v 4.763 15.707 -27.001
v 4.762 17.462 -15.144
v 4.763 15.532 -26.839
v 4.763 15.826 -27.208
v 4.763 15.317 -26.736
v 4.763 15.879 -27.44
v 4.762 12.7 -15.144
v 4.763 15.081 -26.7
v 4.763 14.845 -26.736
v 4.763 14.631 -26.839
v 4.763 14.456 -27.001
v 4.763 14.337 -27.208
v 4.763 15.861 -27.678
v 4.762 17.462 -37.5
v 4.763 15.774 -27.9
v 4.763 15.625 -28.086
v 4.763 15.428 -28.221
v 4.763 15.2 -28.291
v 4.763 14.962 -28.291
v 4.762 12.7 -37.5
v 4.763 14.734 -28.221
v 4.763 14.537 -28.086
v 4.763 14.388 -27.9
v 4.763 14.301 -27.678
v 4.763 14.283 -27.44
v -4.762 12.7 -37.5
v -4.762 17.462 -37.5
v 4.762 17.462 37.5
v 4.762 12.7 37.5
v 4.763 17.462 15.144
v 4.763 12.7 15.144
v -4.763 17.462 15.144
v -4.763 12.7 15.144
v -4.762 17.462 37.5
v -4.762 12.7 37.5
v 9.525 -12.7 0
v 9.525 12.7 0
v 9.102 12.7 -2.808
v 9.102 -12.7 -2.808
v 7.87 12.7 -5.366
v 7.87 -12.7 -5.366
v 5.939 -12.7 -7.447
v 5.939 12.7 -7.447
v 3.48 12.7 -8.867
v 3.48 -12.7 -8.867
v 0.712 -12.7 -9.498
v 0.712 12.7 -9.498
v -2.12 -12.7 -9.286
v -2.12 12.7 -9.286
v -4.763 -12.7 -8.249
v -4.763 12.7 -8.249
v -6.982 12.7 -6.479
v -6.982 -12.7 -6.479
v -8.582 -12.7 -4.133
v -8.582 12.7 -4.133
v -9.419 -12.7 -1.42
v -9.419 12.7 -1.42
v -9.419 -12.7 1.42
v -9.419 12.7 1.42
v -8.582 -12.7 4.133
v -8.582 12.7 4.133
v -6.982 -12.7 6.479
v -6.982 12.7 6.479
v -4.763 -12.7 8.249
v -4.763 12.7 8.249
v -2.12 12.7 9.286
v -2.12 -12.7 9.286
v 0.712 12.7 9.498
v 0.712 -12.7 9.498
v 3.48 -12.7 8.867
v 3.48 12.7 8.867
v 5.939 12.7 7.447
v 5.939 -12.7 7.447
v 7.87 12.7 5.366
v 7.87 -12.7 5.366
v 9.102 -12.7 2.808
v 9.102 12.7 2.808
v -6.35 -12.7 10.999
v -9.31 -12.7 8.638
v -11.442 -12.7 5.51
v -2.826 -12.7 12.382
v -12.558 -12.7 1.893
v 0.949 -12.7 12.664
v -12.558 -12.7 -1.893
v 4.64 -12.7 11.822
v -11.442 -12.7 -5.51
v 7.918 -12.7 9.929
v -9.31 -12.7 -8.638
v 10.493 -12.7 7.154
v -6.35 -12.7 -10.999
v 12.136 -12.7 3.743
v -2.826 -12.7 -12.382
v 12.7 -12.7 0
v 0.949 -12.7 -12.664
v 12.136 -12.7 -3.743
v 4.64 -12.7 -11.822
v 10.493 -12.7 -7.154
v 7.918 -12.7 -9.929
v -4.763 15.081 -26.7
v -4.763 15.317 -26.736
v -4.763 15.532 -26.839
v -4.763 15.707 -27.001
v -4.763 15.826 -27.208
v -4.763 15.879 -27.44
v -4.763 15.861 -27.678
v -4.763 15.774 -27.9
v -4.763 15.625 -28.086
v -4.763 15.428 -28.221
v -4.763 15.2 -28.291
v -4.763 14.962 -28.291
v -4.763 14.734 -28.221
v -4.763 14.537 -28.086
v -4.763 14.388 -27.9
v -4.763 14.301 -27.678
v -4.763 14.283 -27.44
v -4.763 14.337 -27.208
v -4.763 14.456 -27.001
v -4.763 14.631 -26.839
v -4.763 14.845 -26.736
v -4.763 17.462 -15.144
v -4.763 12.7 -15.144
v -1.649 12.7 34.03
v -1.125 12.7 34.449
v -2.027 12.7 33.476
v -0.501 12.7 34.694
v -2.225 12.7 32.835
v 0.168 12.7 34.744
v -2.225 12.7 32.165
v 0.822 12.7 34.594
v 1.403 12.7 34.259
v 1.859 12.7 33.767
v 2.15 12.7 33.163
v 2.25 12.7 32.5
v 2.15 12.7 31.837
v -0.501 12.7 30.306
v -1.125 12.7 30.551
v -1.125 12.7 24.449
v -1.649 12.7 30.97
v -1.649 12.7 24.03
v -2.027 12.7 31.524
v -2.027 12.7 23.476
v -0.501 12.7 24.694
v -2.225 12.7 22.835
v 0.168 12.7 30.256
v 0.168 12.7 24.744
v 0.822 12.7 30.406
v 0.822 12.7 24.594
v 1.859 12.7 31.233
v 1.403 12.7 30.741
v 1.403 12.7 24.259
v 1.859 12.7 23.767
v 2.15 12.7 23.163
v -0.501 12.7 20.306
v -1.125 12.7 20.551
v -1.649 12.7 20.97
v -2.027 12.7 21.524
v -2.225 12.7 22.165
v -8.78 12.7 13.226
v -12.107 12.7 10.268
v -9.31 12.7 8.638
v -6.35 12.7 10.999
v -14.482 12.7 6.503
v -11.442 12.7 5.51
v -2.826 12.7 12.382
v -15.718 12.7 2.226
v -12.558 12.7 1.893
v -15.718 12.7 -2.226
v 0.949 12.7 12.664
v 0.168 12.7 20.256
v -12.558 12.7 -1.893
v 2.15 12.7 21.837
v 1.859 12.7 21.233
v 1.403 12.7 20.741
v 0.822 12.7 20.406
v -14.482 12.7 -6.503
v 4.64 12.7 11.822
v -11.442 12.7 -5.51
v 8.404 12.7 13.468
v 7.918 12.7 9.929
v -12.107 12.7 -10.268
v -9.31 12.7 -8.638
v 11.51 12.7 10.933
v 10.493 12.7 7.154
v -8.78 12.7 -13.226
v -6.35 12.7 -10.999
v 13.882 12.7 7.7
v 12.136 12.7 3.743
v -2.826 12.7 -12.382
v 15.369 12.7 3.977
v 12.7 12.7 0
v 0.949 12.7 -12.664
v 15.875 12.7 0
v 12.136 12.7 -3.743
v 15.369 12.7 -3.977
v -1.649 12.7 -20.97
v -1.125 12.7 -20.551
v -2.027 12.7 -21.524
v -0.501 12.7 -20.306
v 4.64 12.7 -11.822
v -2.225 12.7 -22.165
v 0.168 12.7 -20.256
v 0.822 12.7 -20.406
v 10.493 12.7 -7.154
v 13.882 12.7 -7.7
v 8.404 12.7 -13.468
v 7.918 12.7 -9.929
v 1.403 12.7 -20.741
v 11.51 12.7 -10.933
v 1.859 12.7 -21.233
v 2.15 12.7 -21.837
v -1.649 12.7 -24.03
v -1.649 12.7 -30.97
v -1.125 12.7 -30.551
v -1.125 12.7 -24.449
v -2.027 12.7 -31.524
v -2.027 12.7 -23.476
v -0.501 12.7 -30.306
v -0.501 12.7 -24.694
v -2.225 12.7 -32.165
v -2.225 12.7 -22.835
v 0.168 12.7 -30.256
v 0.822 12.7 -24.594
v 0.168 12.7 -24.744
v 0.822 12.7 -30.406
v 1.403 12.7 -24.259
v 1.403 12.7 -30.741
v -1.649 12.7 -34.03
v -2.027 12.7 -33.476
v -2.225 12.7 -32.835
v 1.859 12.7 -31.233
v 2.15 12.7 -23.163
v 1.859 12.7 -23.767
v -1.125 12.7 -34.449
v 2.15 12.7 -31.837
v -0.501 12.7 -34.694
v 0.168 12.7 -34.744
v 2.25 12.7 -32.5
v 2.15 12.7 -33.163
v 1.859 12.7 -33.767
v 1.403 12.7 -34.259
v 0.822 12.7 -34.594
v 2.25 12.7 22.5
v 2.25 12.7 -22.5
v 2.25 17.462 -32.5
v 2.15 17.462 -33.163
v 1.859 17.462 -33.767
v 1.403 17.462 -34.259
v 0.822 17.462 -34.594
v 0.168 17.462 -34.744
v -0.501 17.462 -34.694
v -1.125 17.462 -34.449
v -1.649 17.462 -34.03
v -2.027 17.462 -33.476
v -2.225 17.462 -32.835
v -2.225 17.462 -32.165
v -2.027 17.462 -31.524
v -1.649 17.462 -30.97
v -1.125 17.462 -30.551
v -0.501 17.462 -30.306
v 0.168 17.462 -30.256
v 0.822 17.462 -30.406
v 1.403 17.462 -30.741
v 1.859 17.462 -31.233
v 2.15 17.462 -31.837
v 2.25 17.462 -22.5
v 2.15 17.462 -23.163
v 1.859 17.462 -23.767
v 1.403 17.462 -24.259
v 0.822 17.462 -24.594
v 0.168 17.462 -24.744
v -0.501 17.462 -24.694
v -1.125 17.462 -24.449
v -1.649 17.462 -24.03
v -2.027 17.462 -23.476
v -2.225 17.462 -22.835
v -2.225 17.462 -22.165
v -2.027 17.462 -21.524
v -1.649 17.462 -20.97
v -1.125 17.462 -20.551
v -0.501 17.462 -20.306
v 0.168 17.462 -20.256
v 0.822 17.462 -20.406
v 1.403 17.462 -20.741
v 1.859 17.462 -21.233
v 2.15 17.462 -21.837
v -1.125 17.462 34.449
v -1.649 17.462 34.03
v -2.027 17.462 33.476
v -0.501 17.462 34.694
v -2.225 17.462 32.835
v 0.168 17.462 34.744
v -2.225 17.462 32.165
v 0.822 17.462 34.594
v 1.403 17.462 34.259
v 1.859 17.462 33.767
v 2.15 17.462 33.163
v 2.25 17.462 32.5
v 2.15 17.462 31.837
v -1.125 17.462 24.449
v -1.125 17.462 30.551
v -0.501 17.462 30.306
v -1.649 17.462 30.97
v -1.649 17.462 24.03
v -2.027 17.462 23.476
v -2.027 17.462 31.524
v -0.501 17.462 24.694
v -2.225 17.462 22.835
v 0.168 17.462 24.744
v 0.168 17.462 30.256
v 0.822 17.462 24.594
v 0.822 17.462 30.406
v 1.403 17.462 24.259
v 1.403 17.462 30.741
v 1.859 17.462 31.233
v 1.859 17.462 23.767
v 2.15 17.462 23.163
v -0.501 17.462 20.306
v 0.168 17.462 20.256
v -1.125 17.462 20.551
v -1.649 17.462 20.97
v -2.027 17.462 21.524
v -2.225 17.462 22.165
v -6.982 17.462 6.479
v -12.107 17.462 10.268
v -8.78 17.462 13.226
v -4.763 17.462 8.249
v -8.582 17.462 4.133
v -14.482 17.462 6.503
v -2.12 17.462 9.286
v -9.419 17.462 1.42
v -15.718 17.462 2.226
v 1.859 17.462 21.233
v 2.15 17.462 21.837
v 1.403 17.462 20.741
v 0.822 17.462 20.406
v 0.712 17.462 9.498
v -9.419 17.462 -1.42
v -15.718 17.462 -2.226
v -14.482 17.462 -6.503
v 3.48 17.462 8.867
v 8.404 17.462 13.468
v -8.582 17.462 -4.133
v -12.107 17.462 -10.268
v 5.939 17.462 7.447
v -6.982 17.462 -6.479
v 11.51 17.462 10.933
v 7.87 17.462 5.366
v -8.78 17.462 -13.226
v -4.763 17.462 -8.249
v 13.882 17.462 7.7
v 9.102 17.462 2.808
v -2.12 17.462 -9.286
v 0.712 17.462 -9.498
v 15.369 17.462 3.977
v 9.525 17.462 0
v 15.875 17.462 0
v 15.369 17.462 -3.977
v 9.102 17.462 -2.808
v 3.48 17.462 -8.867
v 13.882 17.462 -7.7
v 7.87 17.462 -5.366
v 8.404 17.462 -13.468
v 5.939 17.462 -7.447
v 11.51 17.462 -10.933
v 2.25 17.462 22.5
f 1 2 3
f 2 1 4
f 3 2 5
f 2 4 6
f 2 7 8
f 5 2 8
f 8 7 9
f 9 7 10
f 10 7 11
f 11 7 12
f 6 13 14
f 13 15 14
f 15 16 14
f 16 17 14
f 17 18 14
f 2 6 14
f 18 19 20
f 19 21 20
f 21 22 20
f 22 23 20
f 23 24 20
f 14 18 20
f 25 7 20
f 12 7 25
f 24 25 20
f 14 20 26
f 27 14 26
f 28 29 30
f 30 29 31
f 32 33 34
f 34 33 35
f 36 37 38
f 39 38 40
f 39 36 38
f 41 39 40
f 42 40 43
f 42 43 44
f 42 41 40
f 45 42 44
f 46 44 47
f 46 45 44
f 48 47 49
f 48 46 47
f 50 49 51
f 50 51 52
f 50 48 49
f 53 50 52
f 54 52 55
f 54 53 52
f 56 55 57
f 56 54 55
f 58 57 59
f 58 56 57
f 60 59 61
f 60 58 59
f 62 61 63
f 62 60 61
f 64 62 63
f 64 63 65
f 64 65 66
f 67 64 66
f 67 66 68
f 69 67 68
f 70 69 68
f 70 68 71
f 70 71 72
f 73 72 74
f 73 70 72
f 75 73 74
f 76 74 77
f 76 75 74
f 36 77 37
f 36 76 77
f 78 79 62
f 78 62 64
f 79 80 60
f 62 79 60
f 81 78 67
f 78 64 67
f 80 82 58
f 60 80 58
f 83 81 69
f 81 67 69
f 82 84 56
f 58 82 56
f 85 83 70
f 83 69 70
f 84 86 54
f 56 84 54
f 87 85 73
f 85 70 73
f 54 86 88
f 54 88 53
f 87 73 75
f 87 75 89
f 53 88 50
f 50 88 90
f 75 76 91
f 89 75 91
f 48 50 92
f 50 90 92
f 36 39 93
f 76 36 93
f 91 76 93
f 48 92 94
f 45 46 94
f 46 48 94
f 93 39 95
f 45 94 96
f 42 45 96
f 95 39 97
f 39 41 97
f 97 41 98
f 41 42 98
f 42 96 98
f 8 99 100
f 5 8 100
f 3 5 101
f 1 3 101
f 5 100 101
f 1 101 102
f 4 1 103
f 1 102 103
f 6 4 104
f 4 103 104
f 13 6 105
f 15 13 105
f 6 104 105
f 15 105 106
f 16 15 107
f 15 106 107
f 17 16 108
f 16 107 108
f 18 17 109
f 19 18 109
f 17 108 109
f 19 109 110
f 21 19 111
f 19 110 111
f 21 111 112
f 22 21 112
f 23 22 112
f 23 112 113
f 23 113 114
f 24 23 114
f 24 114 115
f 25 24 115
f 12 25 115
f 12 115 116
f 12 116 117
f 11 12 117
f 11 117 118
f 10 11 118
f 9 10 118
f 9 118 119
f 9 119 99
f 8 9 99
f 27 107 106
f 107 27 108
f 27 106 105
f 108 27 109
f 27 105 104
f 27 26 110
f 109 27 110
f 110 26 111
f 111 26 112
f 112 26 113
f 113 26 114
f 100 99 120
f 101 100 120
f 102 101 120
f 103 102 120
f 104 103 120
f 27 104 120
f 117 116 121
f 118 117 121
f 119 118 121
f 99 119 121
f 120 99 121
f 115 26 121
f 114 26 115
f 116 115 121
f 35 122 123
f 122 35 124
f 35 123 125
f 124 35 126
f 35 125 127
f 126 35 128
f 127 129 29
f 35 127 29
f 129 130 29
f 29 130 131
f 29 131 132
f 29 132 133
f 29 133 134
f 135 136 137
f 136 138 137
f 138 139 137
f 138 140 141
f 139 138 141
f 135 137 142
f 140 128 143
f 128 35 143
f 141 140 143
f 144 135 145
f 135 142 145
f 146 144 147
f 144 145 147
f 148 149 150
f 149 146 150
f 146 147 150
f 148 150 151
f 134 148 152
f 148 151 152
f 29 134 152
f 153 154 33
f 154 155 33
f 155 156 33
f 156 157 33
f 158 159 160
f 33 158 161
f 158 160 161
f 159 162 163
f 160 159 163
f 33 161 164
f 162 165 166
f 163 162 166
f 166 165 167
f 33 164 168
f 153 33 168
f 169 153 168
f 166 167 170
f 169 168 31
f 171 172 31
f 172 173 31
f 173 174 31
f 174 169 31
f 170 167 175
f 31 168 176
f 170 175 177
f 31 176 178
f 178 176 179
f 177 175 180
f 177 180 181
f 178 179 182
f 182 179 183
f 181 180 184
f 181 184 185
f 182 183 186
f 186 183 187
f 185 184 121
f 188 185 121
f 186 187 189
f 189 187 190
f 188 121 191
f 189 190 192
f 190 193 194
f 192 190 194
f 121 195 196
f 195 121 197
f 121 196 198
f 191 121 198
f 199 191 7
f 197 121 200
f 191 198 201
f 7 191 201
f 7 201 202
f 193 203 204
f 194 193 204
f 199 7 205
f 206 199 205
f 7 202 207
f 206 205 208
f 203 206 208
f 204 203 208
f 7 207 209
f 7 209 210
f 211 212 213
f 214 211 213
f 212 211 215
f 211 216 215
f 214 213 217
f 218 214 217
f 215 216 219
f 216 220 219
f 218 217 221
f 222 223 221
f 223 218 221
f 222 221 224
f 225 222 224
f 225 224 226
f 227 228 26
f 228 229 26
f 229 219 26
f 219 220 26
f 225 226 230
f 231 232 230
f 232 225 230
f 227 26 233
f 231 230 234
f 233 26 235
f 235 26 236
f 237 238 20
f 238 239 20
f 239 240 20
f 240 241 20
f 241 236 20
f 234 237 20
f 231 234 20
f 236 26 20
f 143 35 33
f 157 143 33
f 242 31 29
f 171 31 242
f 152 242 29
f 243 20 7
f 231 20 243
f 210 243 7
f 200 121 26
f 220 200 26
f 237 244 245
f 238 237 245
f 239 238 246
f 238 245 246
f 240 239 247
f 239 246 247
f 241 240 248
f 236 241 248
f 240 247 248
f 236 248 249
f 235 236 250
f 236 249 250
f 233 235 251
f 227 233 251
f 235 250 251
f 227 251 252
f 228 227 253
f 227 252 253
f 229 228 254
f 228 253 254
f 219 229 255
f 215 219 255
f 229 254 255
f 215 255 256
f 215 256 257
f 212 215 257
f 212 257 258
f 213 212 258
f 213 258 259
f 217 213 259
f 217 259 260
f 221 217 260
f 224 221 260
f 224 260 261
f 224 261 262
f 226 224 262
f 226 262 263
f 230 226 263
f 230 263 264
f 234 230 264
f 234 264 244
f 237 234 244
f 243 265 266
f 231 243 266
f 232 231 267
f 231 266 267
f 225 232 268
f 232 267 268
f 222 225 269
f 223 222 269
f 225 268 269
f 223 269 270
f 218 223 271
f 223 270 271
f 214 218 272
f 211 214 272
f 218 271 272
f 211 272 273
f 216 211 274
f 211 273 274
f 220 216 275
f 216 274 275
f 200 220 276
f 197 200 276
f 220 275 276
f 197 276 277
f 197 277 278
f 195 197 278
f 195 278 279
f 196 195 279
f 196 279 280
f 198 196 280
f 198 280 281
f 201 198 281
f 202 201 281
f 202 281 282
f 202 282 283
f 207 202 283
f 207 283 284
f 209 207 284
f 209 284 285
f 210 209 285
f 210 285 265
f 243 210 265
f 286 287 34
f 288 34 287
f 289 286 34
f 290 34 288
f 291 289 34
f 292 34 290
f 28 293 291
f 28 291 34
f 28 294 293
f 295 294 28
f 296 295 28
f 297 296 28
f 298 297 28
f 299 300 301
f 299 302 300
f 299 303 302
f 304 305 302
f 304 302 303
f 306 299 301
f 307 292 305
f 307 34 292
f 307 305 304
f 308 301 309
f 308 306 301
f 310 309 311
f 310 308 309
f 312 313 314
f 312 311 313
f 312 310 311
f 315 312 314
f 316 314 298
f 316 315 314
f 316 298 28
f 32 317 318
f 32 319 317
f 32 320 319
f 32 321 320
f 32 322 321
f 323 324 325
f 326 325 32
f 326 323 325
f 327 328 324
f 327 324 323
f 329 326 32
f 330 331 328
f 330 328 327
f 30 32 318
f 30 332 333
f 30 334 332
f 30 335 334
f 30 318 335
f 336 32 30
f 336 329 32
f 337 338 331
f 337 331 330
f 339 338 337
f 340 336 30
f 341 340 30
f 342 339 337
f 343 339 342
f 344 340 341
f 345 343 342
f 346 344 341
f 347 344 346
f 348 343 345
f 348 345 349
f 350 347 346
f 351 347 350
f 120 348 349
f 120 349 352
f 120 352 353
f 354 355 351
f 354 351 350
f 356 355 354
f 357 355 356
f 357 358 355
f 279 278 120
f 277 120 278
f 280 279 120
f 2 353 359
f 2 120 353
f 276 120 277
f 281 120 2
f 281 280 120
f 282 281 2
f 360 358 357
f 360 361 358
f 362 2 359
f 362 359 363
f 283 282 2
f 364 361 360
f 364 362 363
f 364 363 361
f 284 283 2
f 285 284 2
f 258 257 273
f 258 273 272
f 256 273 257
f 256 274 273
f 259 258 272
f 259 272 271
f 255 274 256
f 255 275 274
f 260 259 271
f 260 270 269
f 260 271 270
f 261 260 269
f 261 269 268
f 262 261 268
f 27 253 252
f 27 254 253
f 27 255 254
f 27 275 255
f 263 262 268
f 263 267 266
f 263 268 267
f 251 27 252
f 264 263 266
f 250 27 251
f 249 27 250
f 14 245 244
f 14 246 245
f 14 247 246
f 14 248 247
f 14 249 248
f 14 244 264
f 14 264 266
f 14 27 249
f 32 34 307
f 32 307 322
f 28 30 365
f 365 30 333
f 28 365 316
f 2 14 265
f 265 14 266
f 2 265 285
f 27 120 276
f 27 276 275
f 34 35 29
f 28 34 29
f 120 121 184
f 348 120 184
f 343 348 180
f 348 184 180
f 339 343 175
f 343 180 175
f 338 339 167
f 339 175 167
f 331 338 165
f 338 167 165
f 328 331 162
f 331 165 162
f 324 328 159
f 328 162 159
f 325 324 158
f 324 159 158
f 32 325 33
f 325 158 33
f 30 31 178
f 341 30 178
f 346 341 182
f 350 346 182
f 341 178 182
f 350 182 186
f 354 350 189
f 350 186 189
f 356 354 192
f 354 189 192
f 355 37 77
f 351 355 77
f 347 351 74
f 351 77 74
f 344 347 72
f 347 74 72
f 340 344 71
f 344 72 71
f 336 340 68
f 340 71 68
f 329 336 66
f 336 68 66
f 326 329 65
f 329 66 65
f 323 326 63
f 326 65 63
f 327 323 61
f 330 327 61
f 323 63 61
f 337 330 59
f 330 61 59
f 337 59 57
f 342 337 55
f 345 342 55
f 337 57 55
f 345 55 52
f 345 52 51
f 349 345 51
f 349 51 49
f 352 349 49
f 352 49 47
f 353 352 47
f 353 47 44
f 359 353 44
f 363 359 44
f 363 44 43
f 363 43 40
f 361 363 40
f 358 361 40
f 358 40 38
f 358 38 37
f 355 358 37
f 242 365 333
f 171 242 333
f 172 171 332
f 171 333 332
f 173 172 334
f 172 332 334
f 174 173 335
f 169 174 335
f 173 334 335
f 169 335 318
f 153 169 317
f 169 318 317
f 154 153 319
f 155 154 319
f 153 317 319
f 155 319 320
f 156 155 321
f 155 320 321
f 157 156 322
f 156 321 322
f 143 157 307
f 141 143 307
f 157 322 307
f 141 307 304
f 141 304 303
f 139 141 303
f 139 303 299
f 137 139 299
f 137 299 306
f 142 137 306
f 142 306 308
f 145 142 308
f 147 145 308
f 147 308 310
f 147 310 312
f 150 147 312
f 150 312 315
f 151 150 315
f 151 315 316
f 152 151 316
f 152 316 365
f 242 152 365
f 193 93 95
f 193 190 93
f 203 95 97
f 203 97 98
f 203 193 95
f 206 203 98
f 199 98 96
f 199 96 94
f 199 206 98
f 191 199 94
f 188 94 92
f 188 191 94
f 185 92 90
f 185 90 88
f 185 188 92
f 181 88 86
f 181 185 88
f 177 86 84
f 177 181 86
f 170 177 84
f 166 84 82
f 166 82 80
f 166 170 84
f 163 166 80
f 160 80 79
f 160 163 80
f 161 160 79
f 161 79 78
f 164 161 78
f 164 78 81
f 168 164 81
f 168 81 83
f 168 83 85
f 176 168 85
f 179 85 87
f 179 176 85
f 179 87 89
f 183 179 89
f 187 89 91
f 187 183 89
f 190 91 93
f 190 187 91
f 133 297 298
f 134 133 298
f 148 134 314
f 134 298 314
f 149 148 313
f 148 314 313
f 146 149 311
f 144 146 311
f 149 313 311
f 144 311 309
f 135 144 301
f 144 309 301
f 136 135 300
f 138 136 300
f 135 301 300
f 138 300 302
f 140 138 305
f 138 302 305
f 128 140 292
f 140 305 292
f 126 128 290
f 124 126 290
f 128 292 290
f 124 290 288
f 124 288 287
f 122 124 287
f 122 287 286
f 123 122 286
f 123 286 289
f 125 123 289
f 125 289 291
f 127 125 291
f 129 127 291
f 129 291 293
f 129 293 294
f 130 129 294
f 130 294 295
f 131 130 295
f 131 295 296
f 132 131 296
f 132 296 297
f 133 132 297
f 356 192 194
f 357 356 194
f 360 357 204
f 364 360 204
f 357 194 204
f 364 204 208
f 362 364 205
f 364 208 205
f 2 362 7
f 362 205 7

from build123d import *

# Parameters (mm, degrees)
SKETCH2_R             = 12.7
SKETCH2_R_2           = 9.525
BOSS_EXTRUDE1_DEPTH   = 12.7
SKETCH3_R             = 12.7
BOSS_EXTRUDE2_DEPTH   = 4.7625
SKETCH4_R             = 9.525
CUT_EXTRUDE1_DEPTH    = 5.7625
M4_CLEARANCE_HOLE1_D  = 4.5
M2X0_4_TAPPED_HOLE1_D = 1.6


with BuildPart() as part:
    # Sketch2 → Boss-Extrude1 (new body, symmetric)
    with BuildSketch(Plane(origin=(0, 0, 0), x_dir=(1, 0, 0), z_dir=(0, 1, 0))):
        Circle(SKETCH2_R)
        Circle(SKETCH2_R_2, mode=Mode.SUBTRACT)
    extrude(amount=BOSS_EXTRUDE1_DEPTH, both=True)

    # Sketch3 → Boss-Extrude2 (add)
    with BuildSketch(Plane(origin=(0, 12.7, 0), x_dir=(1, 0, 0), z_dir=(0, 1, 0))):
        with BuildLine():
            ThreePointArc((-4.7625, -15.143784822), (0, -15.875), (4.7625, -15.143784822))
            Line((4.7625, -15.143784822), (4.7625, -11.773215098))
            ThreePointArc((4.7625, -11.773215098), (0, -12.7), (-4.7625, -11.773215098))
            Line((-4.7625, -11.773215098), (-4.7625, -15.143784822))
        make_face()
        with BuildLine():
            ThreePointArc((4.7625, 15.143784822), (0, 15.875), (-4.7625, 15.143784822))
            Line((-4.7625, 15.143784822), (-4.7625, 11.773215098))
            ThreePointArc((-4.7625, 11.773215098), (0, 12.7), (4.7625, 11.773215098))
            Line((4.7625, 11.773215098), (4.7625, 15.143784822))
        make_face()
        with BuildLine():
            Line((-4.7625, -37.5), (4.7625, -37.5))
            Line((4.7625, -37.5), (4.7625, -15.143784822))
            ThreePointArc((4.7625, -15.143784822), (0, -15.875), (-4.7625, -15.143784822))
            Line((-4.7625, -15.143784822), (-4.7625, -37.5))
        make_face()
        with BuildLine():
            Line((-4.7625, 37.5), (-4.7625, 15.143784822))
            ThreePointArc((-4.7625, 15.143784822), (0, 15.875), (4.7625, 15.143784822))
            Line((4.7625, 15.143784822), (4.7625, 37.5))
            Line((4.7625, 37.5), (-4.7625, 37.5))
        make_face()
        with BuildLine():
            Line((4.7625, -11.773215098), (4.7625, -15.143784822))
            ThreePointArc((4.7625, -15.143784822), (12.798834175, -9.391776656), (15.875, 0))
            ThreePointArc((15.875, 0), (12.798834175, 9.391776656), (4.7625, 15.143784822))
            Line((4.7625, 15.143784822), (4.7625, 11.773215098))
            ThreePointArc((4.7625, 11.773215098), (10.530283709, 7.099515829), (12.7, 0))
            ThreePointArc((12.7, 0), (10.530283709, -7.099515829), (4.7625, -11.773215098))
        make_face()
        with BuildLine():
            ThreePointArc((-4.7625, 15.143784822), (-15.875, 0), (-4.7625, -15.143784822))
            Line((-4.7625, -15.143784822), (-4.7625, -11.773215098))
            ThreePointArc((-4.7625, -11.773215098), (-12.7, 0), (-4.7625, 11.773215098))
            Line((-4.7625, 11.773215098), (-4.7625, 15.143784822))
        make_face()
        Circle(SKETCH3_R)
    extrude(amount=BOSS_EXTRUDE2_DEPTH)

    # Sketch4 → Cut-Extrude1 (cut, through all)
    with BuildSketch(Plane.XZ.offset(-12.7)):
        Circle(SKETCH4_R)
    extrude(amount=-CUT_EXTRUDE1_DEPTH, mode=Mode.SUBTRACT)

    # M4 Clearance Hole1 (through all)
    with Locations(Plane(origin=(0, 12.7, 0), x_dir=(-1, 0, 0), z_dir=(0, -1, 0))):
        with Locations((0, 32.5), (0, 22.5), (0, -22.5), (0, -32.5)):
            Hole(M4_CLEARANCE_HOLE1_D / 2)

    # M2x0.4 Tapped Hole1 (through all)
    with Locations(Plane(origin=(4.7625, 0, 0), x_dir=(0, 0, -1), z_dir=(1, 0, 0))):
        with Locations((27.5, 15.08125)):
            Hole(M2X0_4_TAPPED_HOLE1_D / 2)


solid = part.part
